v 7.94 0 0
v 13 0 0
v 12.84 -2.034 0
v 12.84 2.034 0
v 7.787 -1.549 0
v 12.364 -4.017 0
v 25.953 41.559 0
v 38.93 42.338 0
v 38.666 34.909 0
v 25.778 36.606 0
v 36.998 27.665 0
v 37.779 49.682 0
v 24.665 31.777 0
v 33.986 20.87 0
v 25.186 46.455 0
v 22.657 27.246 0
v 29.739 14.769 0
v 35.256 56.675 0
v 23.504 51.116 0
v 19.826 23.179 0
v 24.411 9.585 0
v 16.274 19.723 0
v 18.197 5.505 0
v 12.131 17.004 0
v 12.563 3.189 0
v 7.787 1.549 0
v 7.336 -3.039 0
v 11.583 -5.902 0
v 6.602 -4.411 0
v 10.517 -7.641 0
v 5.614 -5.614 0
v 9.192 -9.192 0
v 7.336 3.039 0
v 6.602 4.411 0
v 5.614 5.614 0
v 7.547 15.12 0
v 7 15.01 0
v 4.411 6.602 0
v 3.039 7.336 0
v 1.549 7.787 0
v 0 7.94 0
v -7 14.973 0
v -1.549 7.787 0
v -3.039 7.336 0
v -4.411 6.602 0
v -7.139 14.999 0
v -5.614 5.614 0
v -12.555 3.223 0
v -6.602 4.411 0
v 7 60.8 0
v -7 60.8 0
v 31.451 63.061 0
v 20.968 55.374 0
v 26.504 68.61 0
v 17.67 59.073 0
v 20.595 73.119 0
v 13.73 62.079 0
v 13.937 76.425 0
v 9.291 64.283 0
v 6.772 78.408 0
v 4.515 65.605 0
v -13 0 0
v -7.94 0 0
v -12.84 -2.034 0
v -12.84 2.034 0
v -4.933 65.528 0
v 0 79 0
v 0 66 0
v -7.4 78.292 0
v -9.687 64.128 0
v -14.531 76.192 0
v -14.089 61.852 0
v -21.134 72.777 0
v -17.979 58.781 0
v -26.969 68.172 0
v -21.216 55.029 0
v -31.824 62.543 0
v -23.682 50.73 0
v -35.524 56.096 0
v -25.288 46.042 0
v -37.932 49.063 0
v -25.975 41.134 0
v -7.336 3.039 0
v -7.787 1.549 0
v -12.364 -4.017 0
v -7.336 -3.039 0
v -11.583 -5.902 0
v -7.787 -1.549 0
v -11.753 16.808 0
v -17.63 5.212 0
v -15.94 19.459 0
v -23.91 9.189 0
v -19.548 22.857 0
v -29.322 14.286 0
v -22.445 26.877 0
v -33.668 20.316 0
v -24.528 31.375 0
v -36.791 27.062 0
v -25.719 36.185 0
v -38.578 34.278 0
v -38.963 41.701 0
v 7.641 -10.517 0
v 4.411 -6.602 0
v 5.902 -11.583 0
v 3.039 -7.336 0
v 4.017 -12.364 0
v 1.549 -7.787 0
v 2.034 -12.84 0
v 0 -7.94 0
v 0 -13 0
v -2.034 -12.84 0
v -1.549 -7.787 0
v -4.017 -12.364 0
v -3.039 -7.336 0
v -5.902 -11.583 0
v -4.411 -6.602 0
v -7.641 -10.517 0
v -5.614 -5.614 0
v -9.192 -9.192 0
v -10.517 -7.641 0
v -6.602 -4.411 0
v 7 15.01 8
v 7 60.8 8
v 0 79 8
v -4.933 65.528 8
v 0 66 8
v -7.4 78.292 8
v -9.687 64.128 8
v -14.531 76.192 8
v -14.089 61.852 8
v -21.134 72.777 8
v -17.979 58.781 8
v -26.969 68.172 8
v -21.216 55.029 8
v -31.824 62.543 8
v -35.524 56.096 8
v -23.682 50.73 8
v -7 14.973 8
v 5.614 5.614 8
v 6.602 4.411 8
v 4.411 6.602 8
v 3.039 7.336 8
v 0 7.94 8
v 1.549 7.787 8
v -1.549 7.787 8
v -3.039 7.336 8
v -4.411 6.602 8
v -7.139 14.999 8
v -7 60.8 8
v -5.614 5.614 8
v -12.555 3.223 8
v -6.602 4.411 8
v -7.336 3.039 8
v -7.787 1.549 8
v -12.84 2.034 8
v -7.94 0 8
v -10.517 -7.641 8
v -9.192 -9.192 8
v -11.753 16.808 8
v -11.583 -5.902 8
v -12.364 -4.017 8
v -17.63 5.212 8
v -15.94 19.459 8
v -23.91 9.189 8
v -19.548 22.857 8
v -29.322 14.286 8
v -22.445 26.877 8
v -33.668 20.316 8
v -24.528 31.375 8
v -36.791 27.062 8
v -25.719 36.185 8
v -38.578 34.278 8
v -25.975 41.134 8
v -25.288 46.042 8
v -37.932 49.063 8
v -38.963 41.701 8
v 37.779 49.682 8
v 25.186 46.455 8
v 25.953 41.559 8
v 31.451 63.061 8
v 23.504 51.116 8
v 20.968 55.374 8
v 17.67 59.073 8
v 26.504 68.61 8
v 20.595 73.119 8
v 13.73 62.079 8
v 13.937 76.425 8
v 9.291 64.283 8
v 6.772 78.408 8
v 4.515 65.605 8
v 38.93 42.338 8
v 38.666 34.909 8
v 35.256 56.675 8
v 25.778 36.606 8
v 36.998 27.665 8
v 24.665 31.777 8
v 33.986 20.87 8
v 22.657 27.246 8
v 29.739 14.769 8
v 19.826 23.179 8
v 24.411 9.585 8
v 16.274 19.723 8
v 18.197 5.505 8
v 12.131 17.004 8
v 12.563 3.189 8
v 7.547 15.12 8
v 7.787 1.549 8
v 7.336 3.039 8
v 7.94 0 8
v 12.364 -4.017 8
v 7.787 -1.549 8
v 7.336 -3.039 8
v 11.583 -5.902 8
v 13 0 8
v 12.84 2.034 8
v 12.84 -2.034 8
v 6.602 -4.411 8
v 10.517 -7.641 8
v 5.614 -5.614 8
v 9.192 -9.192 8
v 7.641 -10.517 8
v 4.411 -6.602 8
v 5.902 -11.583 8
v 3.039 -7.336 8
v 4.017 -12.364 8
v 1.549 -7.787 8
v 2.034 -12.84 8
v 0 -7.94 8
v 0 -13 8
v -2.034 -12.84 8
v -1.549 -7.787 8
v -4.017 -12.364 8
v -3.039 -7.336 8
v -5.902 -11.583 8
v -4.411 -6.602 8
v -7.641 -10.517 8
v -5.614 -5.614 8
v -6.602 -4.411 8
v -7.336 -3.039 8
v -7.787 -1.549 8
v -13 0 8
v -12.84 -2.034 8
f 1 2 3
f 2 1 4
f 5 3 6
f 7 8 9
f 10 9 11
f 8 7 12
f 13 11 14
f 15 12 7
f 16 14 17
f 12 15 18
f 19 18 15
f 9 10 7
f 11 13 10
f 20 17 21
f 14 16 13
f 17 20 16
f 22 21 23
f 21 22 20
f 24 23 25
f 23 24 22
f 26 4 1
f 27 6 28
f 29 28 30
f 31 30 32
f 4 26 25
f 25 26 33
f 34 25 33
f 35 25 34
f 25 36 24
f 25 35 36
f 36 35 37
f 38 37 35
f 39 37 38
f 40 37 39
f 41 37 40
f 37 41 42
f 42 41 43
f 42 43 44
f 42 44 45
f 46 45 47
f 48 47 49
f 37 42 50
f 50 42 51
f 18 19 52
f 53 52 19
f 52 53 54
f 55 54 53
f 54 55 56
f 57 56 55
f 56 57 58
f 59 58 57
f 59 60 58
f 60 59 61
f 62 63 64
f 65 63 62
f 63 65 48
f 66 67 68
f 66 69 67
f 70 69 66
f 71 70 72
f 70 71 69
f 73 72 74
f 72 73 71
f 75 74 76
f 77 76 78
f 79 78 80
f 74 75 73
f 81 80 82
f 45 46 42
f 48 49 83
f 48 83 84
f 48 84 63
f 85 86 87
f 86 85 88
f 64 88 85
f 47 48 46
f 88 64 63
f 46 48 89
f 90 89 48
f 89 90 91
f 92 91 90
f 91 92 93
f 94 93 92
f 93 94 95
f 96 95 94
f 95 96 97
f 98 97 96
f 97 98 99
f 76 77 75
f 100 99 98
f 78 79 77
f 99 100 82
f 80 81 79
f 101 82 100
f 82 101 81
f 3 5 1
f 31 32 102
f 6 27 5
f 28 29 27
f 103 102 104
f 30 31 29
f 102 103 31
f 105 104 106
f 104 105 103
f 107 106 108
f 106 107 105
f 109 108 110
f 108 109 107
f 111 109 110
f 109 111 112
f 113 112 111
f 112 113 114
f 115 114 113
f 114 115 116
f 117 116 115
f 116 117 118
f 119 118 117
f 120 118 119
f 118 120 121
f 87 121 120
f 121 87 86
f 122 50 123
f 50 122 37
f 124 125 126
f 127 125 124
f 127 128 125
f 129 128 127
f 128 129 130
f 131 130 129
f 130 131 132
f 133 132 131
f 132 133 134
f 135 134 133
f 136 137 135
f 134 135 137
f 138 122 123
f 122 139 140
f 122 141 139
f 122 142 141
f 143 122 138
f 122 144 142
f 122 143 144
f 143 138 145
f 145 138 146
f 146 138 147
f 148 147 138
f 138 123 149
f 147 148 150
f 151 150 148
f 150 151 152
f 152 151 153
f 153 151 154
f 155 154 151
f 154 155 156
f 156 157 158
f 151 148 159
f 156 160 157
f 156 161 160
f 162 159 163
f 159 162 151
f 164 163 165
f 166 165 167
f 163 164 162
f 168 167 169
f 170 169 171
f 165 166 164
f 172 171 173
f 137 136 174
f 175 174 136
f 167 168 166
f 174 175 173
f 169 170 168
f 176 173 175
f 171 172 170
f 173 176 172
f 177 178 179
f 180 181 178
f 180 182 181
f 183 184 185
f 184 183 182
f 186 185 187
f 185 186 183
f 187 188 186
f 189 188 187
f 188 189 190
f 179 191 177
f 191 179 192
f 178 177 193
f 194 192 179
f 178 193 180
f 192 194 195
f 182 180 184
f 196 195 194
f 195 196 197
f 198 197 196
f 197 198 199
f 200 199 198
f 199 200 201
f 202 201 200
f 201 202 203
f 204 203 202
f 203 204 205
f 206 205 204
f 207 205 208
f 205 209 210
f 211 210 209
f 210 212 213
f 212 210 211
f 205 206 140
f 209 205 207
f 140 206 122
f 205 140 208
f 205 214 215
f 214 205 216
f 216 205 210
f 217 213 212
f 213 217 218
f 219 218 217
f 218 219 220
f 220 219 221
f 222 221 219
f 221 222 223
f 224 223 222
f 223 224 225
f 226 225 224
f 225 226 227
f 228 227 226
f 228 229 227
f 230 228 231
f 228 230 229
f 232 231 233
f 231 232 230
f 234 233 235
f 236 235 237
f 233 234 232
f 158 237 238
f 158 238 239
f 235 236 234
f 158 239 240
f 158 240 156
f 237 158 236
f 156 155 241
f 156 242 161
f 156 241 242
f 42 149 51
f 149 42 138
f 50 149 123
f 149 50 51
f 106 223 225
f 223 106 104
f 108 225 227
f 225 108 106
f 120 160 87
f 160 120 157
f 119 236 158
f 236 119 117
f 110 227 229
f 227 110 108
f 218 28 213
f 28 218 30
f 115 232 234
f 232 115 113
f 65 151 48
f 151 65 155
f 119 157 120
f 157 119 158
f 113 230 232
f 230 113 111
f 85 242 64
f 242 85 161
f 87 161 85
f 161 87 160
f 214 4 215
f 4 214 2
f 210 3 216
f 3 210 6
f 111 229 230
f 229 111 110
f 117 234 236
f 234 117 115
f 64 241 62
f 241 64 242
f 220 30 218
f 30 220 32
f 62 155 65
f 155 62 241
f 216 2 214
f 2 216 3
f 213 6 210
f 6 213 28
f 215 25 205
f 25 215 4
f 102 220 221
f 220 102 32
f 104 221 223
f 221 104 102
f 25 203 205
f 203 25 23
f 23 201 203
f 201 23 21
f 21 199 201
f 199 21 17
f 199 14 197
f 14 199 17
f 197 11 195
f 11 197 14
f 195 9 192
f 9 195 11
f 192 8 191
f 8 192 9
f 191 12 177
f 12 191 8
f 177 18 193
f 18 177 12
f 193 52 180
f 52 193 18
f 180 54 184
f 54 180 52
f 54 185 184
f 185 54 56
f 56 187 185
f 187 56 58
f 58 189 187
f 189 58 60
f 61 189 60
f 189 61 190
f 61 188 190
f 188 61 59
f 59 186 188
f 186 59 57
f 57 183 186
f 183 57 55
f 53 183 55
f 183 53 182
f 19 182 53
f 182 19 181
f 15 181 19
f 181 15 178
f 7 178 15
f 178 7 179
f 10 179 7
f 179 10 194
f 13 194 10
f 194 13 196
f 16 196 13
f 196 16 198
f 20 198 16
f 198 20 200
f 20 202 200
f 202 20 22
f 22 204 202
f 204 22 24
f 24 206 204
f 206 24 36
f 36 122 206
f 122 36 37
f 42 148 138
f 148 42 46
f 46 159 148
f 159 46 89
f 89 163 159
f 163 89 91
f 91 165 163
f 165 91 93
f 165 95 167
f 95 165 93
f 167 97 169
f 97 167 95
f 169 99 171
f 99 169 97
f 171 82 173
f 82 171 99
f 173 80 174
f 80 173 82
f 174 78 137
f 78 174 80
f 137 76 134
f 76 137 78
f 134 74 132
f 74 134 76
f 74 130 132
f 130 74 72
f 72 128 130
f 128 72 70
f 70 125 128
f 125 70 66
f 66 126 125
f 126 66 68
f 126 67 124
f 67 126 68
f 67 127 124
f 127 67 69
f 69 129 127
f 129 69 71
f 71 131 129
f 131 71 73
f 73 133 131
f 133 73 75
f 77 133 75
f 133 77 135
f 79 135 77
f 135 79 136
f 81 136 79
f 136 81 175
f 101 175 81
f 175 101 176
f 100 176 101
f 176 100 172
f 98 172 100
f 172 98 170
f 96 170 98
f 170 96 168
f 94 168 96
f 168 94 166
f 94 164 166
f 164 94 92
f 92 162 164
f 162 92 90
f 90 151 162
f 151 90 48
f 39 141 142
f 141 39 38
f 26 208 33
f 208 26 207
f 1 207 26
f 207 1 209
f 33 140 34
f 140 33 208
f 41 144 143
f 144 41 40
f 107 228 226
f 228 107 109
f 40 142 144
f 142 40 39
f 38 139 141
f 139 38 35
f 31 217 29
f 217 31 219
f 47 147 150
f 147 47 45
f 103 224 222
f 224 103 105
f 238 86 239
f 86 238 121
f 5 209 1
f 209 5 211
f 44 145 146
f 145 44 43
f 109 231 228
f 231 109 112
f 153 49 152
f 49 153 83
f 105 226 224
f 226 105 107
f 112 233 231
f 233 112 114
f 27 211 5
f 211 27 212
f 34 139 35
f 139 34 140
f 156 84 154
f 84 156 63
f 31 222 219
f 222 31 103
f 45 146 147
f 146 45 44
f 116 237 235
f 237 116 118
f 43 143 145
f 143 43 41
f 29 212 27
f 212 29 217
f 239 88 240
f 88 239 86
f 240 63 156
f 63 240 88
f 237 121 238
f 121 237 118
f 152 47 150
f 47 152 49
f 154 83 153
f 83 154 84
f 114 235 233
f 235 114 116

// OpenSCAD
$fn = 32;

// ----------------------------------------------------------------------
// Hook: 80 mm shank into a 26 mm curl, 8 mm thick
// ----------------------------------------------------------------------

// --- parameters (mm) ---
shank_len = 80;           // shank length from the boss centre
shank_w = 14;             // shank width
boss_d = 26;              // boss diameter
bore_d = 15.88;           // boss bore
curl_in = 26;             // curl inner radius
curl_out = 39;            // curl outer radius
curl_sweep = 350;         // curl sweep angle
hook_t = 8;               // hook thickness

shank_profile = [[-7, 60.8], [7, 60.8], [7, 11], [-7, 11]];
boss_profile = [[13, 0], [12.84, 2.034], [12.364, 4.017], [11.583, 5.902], [10.517, 7.641], [9.192, 9.192], [7.641, 10.517], [5.902, 11.583], [4.017, 12.364], [2.034, 12.84], [0, 13], [-2.034, 12.84], [-4.017, 12.364], [-5.902, 11.583], [-7.641, 10.517], [-9.192, 9.192], [-10.517, 7.641], [-11.583, 5.902], [-12.364, 4.017], [-12.84, 2.034], [-13, 0], [-12.84, -2.034], [-12.364, -4.017], [-11.583, -5.902], [-10.517, -7.641], [-9.192, -9.192], [-7.641, -10.517], [-5.902, -11.583], [-4.017, -12.364], [-2.034, -12.84], [0, -13], [2.034, -12.84], [4.017, -12.364], [5.902, -11.583], [7.641, -10.517], [9.192, -9.192], [10.517, -7.641], [11.583, -5.902], [12.364, -4.017], [12.84, -2.034]];
curl_profile = [[0, 79], [-7.4, 78.292], [-14.531, 76.192], [-21.134, 72.777], [-26.969, 68.172], [-31.824, 62.543], [-35.524, 56.096], [-37.932, 49.063], [-38.963, 41.701], [-38.578, 34.278], [-36.791, 27.062], [-33.668, 20.316], [-29.322, 14.286], [-23.91, 9.189], [-17.63, 5.212], [-10.709, 2.499], [-3.399, 1.148], [4.034, 1.209], [11.321, 2.679], [18.197, 5.505], [24.411, 9.585], [29.739, 14.769], [33.986, 20.87], [36.998, 27.665], [38.666, 34.909], [38.93, 42.338], [37.779, 49.682], [35.256, 56.675], [31.451, 63.061], [26.504, 68.61], [20.595, 73.119], [13.937, 76.425], [6.772, 78.408], [4.515, 65.605], [9.291, 64.283], [13.73, 62.079], [17.67, 59.073], [20.968, 55.374], [23.504, 51.116], [25.186, 46.455], [25.953, 41.559], [25.778, 36.606], [24.665, 31.777], [22.657, 27.246], [19.826, 23.179], [16.274, 19.723], [12.131, 17.004], [7.547, 15.12], [2.69, 14.139], [-2.266, 14.099], [-7.139, 14.999], [-11.753, 16.808], [-15.94, 19.459], [-19.548, 22.857], [-22.445, 26.877], [-24.528, 31.375], [-25.719, 36.185], [-25.975, 41.134], [-25.288, 46.042], [-23.682, 50.73], [-21.216, 55.029], [-17.979, 58.781], [-14.089, 61.852], [-9.687, 64.128], [-4.933, 65.528], [0, 66]];

difference() {
  union() {
    /* three overlapping outlines: shank, boss and the smooth curl */
    linear_extrude(height = hook_t) polygon(shank_profile);
    linear_extrude(height = hook_t) polygon(boss_profile);
    linear_extrude(height = hook_t) polygon(curl_profile);
  }
  translate([0, 0, -2.5]) cylinder(h = hook_t + 5, d = bore_d);
}
